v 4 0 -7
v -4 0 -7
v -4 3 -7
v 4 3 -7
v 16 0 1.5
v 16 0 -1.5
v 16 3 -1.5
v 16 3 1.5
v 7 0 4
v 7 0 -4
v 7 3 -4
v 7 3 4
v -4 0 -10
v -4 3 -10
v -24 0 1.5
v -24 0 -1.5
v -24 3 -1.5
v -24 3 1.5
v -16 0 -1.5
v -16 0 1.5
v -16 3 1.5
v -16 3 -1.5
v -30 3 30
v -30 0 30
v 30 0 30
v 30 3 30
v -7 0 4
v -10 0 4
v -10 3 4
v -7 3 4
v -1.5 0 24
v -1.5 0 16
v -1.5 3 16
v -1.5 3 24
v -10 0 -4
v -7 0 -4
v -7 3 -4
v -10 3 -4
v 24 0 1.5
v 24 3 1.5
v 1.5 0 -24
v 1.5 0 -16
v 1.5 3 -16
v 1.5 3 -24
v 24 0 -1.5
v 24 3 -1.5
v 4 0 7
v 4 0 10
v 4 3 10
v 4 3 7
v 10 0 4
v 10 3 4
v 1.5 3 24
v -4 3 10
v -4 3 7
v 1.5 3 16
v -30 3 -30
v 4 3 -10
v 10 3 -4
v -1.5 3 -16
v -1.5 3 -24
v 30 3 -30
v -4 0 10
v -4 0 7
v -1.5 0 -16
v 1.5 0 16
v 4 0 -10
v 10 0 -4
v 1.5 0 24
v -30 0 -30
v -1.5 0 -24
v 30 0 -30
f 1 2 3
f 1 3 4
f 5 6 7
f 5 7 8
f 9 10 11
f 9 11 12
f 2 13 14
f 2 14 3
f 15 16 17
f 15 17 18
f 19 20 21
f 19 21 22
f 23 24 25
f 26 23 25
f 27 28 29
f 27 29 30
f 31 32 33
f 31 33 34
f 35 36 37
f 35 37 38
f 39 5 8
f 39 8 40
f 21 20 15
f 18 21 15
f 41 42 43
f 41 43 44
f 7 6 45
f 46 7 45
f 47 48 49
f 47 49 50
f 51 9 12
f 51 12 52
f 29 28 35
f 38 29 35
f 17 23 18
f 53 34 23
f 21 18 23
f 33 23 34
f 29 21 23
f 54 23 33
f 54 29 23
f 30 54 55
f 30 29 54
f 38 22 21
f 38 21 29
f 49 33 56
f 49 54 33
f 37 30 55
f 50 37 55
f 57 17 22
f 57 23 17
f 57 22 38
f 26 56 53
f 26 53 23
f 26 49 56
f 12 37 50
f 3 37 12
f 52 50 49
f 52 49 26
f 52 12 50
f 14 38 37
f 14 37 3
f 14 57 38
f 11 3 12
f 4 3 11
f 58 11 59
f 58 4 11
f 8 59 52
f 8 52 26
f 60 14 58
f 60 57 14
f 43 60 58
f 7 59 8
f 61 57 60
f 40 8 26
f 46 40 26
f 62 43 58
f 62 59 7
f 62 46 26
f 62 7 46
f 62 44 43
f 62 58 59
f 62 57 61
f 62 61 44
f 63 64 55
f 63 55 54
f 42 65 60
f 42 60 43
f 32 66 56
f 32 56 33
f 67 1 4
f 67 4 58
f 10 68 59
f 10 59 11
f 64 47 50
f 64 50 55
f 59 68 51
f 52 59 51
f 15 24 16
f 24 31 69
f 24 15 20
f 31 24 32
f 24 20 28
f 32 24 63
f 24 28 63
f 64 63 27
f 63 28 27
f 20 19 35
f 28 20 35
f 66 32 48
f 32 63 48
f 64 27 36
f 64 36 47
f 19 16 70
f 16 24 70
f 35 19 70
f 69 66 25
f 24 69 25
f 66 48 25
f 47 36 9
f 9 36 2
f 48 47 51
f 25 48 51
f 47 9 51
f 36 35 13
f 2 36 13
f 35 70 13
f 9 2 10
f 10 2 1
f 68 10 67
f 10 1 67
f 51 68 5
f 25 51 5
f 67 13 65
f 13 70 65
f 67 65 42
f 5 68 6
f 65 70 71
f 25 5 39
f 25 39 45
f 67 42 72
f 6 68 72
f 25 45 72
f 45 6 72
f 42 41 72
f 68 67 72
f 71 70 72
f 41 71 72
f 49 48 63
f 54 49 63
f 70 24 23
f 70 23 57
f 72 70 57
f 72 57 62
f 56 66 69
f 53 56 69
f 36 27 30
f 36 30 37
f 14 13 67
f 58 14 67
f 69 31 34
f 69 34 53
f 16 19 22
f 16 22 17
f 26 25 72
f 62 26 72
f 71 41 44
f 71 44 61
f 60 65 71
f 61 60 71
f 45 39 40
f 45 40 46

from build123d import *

# Parameters (mm, degrees)
CROQUIS1_W              = 60
CROQUIS1_H              = 60
SALIENTE_EXTRUIR1_DEPTH = 3


with BuildPart() as part:
    # Croquis1 → Saliente-Extruir1 (new body)
    with BuildSketch(Plane(origin=(0, 0, 0), x_dir=(1, 0, 0), z_dir=(0, 1, 0))):
        Rectangle(CROQUIS1_W, CROQUIS1_H)
        Polygon((0, 10), (-4, 10), (-4, 7), (4, 7), (4, 10), align=None, mode=Mode.SUBTRACT)
        Polygon((7, 4), (7, -4), (10, -4), (10, 0), (10, 4), align=None, mode=Mode.SUBTRACT)
        Polygon((4, -7), (-4, -7), (-4, -10), (0, -10), (4, -10), align=None, mode=Mode.SUBTRACT)
        Polygon((-7, -4), (-7, 4), (-10, 4), (-10, 0), (-10, -4), align=None, mode=Mode.SUBTRACT)
        Polygon((20, 1.5), (16, 1.5), (16, -1.5), (24, -1.5), (24, 1.5), align=None, mode=Mode.SUBTRACT)
        Polygon((1.5, -20), (1.5, -16), (-1.5, -16), (-1.5, -24), (1.5, -24), align=None, mode=Mode.SUBTRACT)
        Polygon((-20, -1.5), (-16, -1.5), (-16, 1.5), (-24, 1.5), (-24, -1.5), align=None, mode=Mode.SUBTRACT)
        Polygon((-1.5, 20), (-1.5, 16), (1.5, 16), (1.5, 24), (-1.5, 24), align=None, mode=Mode.SUBTRACT)
    extrude(amount=SALIENTE_EXTRUIR1_DEPTH)


solid = part.part
